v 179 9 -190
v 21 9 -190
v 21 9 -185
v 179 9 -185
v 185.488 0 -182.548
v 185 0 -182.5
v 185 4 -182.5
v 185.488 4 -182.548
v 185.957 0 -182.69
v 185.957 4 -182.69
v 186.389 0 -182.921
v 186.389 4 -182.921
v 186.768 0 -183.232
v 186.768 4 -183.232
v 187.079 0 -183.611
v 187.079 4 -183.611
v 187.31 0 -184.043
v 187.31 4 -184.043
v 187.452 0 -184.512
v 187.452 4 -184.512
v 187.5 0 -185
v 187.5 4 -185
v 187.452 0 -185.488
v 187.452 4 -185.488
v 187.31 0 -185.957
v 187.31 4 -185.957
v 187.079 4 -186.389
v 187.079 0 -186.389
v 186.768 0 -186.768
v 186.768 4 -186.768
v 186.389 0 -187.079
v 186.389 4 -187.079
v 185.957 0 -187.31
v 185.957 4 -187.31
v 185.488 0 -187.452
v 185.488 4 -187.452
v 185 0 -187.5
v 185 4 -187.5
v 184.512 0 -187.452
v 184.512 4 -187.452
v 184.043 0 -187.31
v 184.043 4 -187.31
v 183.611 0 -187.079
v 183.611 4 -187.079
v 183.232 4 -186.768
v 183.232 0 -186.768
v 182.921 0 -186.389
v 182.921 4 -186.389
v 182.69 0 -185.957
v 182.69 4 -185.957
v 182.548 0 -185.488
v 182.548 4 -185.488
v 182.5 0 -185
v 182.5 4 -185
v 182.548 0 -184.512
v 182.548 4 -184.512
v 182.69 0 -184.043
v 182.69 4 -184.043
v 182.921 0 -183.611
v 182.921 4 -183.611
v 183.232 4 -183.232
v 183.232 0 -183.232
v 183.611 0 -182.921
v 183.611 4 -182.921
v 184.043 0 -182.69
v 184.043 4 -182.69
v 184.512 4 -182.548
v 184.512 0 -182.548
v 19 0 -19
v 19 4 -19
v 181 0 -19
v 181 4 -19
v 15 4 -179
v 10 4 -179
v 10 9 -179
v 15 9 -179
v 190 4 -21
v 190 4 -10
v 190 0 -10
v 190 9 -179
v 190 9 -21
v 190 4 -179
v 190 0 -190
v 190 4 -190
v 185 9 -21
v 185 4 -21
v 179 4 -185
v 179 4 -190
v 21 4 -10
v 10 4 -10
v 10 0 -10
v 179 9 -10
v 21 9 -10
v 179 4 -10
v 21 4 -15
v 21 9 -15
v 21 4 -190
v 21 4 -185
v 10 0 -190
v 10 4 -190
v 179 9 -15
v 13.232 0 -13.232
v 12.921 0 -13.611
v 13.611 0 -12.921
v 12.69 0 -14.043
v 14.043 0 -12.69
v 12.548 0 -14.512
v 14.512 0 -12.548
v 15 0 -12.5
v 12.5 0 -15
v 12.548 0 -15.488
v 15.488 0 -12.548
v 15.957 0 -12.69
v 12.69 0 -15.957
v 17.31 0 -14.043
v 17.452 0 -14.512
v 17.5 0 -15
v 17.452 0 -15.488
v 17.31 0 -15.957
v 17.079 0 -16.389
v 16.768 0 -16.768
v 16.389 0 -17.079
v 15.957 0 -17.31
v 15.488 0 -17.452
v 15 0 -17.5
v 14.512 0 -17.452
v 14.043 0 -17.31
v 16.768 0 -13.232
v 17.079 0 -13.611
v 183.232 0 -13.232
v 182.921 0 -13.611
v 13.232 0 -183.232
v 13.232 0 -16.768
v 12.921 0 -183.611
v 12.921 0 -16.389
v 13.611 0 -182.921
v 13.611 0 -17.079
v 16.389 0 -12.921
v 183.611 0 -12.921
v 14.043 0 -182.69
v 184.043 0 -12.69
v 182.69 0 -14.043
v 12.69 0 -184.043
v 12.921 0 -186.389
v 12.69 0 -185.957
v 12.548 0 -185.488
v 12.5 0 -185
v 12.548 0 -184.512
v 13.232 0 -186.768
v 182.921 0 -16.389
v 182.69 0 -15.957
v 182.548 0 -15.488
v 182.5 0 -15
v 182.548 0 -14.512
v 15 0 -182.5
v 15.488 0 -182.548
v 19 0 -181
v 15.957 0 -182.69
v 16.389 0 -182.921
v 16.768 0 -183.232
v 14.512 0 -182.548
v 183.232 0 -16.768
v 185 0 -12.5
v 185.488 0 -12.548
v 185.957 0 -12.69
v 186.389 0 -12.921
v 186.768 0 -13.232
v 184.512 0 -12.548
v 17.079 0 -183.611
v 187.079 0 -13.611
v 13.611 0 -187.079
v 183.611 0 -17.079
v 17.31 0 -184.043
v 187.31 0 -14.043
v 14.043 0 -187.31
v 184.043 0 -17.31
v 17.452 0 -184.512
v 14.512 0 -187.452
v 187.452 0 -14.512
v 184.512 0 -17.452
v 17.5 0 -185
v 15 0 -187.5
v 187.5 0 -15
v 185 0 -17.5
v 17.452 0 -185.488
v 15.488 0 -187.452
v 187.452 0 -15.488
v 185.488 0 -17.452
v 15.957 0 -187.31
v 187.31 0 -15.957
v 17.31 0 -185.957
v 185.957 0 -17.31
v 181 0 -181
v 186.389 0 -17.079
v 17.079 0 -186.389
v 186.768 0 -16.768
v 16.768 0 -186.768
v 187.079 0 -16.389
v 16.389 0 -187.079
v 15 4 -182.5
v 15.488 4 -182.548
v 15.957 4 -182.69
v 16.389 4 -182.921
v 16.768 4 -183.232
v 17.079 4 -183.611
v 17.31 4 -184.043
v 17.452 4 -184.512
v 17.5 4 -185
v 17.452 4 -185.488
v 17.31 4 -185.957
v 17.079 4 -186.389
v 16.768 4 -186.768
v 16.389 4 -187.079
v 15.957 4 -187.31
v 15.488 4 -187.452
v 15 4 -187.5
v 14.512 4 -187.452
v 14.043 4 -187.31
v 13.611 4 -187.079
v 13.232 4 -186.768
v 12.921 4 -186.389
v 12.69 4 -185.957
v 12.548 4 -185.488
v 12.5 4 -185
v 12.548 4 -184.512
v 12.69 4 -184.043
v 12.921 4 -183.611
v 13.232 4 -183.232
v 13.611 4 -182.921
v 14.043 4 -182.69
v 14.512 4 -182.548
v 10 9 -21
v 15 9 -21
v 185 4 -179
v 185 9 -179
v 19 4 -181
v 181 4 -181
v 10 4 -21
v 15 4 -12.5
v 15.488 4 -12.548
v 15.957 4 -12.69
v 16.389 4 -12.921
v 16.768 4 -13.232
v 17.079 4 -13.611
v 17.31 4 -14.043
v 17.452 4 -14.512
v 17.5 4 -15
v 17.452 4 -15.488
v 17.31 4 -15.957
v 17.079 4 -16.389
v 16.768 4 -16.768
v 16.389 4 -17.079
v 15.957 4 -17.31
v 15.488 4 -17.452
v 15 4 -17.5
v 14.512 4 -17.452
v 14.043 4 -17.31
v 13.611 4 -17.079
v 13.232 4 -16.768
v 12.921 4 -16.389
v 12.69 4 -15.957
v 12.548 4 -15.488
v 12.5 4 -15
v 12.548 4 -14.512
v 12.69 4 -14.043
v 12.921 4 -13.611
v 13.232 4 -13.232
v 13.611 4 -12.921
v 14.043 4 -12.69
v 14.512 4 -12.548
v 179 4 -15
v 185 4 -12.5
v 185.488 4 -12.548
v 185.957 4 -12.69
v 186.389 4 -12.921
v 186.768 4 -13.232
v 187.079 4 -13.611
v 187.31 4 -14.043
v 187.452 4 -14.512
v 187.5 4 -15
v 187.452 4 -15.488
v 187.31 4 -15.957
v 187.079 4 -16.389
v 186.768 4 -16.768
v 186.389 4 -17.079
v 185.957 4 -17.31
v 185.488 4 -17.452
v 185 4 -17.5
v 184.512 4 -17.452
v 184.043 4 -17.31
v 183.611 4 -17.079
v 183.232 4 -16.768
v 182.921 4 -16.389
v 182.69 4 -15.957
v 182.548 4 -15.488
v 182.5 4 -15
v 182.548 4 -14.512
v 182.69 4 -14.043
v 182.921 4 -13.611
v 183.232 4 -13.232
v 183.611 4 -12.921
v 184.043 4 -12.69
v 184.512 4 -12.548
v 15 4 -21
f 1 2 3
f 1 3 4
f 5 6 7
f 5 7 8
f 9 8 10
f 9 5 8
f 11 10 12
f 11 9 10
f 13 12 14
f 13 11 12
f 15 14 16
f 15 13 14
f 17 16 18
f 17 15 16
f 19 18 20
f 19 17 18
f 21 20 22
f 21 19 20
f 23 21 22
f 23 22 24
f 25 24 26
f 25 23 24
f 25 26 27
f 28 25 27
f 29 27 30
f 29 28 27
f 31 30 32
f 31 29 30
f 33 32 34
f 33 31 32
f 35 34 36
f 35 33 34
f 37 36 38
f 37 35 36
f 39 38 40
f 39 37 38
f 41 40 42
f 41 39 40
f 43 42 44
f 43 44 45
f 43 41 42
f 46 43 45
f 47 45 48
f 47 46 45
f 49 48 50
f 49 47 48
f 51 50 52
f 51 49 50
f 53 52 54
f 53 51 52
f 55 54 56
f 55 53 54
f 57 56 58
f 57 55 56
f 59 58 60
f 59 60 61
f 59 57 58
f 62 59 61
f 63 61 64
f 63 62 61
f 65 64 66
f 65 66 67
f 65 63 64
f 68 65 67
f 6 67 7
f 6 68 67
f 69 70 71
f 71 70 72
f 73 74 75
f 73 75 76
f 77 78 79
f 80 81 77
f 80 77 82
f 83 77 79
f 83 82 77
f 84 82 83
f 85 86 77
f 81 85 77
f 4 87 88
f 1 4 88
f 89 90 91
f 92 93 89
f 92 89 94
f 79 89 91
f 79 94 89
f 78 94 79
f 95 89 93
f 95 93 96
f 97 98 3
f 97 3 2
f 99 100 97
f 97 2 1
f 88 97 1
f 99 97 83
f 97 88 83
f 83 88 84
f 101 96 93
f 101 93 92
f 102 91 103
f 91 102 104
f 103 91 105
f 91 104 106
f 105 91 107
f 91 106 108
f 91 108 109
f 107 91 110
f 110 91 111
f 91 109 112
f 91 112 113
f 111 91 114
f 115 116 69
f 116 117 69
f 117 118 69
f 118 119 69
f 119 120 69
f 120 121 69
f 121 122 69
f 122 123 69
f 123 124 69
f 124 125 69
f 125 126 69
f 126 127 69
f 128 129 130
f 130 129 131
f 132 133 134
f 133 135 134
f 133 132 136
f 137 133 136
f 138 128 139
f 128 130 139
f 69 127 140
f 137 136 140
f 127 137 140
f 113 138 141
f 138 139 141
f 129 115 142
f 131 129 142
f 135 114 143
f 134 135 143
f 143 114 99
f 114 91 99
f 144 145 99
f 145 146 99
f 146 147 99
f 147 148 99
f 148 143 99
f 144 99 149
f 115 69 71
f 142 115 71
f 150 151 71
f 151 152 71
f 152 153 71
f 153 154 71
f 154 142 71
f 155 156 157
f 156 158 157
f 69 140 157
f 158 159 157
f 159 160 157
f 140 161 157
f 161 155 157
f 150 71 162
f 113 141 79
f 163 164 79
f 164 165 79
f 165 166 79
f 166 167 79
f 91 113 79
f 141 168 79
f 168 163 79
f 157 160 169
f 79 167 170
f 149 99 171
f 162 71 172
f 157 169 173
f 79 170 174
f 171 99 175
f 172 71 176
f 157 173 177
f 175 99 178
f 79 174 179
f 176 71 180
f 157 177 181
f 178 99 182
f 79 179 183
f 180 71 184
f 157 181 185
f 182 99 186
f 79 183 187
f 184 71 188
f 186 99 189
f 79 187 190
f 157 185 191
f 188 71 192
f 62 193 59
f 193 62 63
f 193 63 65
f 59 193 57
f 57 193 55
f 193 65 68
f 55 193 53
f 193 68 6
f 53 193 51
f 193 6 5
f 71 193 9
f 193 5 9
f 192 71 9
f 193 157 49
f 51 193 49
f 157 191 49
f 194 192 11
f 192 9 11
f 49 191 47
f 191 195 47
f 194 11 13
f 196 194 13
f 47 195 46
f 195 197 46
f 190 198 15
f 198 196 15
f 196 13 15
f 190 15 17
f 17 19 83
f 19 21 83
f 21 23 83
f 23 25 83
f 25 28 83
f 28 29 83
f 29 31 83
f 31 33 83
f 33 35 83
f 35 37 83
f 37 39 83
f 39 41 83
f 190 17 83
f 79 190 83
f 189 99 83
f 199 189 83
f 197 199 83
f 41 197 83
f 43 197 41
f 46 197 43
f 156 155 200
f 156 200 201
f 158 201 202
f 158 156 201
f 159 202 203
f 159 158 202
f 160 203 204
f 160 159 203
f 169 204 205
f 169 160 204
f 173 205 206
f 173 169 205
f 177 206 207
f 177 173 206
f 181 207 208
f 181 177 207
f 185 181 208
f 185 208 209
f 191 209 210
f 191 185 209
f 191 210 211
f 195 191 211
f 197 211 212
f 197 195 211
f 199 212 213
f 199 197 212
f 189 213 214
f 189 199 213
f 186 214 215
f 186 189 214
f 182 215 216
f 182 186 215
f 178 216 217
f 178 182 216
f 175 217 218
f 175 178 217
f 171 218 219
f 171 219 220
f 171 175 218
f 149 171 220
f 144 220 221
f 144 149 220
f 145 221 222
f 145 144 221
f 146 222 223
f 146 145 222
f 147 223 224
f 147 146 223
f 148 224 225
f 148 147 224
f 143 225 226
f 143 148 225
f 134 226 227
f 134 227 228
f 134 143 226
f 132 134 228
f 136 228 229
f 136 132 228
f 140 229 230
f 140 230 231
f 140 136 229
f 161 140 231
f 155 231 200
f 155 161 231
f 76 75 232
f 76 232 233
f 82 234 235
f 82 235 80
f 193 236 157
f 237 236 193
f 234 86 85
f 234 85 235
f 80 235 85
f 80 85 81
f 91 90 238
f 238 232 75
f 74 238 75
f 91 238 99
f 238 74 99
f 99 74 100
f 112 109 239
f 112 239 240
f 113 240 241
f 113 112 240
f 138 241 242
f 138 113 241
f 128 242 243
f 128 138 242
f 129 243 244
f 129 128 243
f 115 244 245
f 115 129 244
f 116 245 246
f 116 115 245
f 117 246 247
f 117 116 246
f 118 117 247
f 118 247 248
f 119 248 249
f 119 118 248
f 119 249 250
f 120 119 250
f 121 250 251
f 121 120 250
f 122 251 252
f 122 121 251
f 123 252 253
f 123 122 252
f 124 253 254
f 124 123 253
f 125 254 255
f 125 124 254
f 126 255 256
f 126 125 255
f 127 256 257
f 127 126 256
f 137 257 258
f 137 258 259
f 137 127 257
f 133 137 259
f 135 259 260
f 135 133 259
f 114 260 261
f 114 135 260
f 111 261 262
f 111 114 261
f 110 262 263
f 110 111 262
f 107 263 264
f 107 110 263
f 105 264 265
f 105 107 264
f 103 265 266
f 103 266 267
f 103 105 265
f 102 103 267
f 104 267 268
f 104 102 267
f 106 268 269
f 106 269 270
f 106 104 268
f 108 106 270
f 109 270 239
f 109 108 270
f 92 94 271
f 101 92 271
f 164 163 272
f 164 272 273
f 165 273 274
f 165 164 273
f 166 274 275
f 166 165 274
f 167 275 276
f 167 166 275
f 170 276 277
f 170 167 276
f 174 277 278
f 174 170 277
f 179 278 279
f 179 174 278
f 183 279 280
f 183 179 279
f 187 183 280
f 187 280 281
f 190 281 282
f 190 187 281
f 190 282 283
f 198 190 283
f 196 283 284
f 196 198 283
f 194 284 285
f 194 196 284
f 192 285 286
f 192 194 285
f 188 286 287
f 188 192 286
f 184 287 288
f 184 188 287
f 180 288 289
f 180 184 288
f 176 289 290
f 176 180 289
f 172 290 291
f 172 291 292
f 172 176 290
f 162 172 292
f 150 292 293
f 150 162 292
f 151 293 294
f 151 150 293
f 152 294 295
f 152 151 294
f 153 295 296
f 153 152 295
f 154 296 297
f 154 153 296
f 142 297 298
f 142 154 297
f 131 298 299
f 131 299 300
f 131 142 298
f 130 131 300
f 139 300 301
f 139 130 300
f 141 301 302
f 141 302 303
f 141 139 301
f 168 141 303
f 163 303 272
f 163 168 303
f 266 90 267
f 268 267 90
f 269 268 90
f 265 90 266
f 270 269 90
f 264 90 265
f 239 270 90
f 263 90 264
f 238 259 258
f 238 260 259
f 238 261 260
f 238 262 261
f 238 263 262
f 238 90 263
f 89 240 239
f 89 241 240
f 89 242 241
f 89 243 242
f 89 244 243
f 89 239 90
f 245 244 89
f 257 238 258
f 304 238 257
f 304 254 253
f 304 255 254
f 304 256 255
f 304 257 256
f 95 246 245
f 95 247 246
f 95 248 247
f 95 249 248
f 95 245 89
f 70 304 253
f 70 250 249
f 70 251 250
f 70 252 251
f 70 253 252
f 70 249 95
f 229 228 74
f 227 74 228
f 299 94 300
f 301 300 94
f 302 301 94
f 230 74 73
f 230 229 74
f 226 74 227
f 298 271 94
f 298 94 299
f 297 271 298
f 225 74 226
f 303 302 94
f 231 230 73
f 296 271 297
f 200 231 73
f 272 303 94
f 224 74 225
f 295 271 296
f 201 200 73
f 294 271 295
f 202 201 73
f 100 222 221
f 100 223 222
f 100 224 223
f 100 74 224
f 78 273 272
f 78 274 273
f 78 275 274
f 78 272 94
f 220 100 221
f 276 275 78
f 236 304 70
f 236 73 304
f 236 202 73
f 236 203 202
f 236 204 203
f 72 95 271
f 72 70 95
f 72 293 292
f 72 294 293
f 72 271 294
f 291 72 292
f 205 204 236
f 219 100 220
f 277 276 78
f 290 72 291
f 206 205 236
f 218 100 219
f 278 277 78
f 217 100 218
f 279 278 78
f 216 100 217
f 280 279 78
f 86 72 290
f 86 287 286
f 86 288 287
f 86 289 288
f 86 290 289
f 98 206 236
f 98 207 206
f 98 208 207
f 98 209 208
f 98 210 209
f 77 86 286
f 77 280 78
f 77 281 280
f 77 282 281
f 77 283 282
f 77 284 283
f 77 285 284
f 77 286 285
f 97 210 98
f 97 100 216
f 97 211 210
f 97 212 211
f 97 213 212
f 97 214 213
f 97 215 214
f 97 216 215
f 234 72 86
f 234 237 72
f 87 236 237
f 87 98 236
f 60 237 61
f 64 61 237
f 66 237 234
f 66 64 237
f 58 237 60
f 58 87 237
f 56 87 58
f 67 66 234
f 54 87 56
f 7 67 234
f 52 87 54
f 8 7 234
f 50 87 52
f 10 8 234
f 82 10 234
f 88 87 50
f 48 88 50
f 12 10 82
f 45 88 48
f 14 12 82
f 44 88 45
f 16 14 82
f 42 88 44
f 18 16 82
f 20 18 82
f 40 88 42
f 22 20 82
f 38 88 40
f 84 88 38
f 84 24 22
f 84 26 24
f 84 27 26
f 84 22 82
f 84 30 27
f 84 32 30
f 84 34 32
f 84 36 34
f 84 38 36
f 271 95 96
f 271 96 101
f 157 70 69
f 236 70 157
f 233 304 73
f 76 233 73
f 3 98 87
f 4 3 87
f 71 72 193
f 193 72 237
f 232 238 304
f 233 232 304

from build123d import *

# Parameters (mm, degrees)
CROQUIS1_W              = 200
CROQUIS1_H              = 200
CROQUIS1_R              = 2.5
SALIENTE_EXTRUIR1_DEPTH = 4
CROQUIS2_W              = 158
CROQUIS2_H              = 158
CORTAR_EXTRUIR1_DEPTH   = 10
CROQUIS3_W              = 200
CROQUIS3_H              = 200
CROQUIS3_W_2            = 180
CROQUIS3_H_2            = 180
CORTAR_EXTRUIR2_DEPTH   = 10
CROQUIS4_W              = 158
CROQUIS4_H              = 5
CROQUIS4_W_2            = 5
CROQUIS4_H_2            = 158
SALIENTE_EXTRUIR2_DEPTH = 5
CROQUIS5_W              = 162
CROQUIS5_H              = 162
CROQUIS5_W_2            = 158
CROQUIS5_H_2            = 158
CORTAR_EXTRUIR4_DEPTH   = 5


with BuildPart() as part:
    # Croquis1 → Saliente-Extruir1 (new body)
    with BuildSketch(Plane(origin=(0, 0, 0), x_dir=(1, 0, 0), z_dir=(0, 1, 0))):
        with Locations((100, 100)):
            Rectangle(CROQUIS1_W, CROQUIS1_H)
        with Locations(Location((15, 185, 0), (0, 0, 270))):
            Circle(CROQUIS1_R, mode=Mode.SUBTRACT)
        with Locations(Location((185, 185, 0), (0, 0, 270))):
            Circle(CROQUIS1_R, mode=Mode.SUBTRACT)
        with Locations(Location((185, 15, 0), (0, 0, 270))):
            Circle(CROQUIS1_R, mode=Mode.SUBTRACT)
        with Locations(Location((15, 15, 0), (0, 0, 270))):
            Circle(CROQUIS1_R, mode=Mode.SUBTRACT)
    extrude(amount=SALIENTE_EXTRUIR1_DEPTH)

    # Croquis2 → Cortar-Extruir1 (cut)
    with BuildSketch(Plane(origin=(0, 4, 0), x_dir=(1, 0, 0), z_dir=(0, 1, 0))):
        with Locations((100, 100)):
            Rectangle(CROQUIS2_W, CROQUIS2_H)
    extrude(amount=-CORTAR_EXTRUIR1_DEPTH, mode=Mode.SUBTRACT)

    # Croquis3 → Cortar-Extruir2 (cut)
    with BuildSketch(Plane(origin=(0, 4, 0), x_dir=(1, 0, 0), z_dir=(0, 1, 0))):
        with Locations((100, 100)):
            Rectangle(CROQUIS3_W, CROQUIS3_H)
        with Locations((100, 100)):
            Rectangle(CROQUIS3_W_2, CROQUIS3_H_2, mode=Mode.SUBTRACT)
    extrude(amount=-CORTAR_EXTRUIR2_DEPTH, mode=Mode.SUBTRACT)

    # Croquis4 → Saliente-Extruir2 (add)
    with BuildSketch(Plane(origin=(0, 4, 0), x_dir=(1, 0, 0), z_dir=(0, 1, 0))):
        with Locations((100, 187.5)):
            Rectangle(CROQUIS4_W, CROQUIS4_H)
        with Locations((187.5, 100)):
            Rectangle(CROQUIS4_W_2, CROQUIS4_H_2)
        with Locations((100, 12.5)):
            Rectangle(CROQUIS4_W, CROQUIS4_H)
        with Locations((12.5, 100)):
            Rectangle(CROQUIS4_W_2, CROQUIS4_H_2)
    extrude(amount=SALIENTE_EXTRUIR2_DEPTH)

    # Croquis5 → Cortar-Extruir4 (cut)
    with BuildSketch(Plane(origin=(0, 4, 0), x_dir=(1, 0, 0), z_dir=(0, 1, 0))):
        with Locations((100, 100)):
            Rectangle(CROQUIS5_W, CROQUIS5_H)
        with Locations((100, 100)):
            Rectangle(CROQUIS5_W_2, CROQUIS5_H_2, mode=Mode.SUBTRACT)
    extrude(amount=-CORTAR_EXTRUIR4_DEPTH, mode=Mode.SUBTRACT)


solid = part.part
